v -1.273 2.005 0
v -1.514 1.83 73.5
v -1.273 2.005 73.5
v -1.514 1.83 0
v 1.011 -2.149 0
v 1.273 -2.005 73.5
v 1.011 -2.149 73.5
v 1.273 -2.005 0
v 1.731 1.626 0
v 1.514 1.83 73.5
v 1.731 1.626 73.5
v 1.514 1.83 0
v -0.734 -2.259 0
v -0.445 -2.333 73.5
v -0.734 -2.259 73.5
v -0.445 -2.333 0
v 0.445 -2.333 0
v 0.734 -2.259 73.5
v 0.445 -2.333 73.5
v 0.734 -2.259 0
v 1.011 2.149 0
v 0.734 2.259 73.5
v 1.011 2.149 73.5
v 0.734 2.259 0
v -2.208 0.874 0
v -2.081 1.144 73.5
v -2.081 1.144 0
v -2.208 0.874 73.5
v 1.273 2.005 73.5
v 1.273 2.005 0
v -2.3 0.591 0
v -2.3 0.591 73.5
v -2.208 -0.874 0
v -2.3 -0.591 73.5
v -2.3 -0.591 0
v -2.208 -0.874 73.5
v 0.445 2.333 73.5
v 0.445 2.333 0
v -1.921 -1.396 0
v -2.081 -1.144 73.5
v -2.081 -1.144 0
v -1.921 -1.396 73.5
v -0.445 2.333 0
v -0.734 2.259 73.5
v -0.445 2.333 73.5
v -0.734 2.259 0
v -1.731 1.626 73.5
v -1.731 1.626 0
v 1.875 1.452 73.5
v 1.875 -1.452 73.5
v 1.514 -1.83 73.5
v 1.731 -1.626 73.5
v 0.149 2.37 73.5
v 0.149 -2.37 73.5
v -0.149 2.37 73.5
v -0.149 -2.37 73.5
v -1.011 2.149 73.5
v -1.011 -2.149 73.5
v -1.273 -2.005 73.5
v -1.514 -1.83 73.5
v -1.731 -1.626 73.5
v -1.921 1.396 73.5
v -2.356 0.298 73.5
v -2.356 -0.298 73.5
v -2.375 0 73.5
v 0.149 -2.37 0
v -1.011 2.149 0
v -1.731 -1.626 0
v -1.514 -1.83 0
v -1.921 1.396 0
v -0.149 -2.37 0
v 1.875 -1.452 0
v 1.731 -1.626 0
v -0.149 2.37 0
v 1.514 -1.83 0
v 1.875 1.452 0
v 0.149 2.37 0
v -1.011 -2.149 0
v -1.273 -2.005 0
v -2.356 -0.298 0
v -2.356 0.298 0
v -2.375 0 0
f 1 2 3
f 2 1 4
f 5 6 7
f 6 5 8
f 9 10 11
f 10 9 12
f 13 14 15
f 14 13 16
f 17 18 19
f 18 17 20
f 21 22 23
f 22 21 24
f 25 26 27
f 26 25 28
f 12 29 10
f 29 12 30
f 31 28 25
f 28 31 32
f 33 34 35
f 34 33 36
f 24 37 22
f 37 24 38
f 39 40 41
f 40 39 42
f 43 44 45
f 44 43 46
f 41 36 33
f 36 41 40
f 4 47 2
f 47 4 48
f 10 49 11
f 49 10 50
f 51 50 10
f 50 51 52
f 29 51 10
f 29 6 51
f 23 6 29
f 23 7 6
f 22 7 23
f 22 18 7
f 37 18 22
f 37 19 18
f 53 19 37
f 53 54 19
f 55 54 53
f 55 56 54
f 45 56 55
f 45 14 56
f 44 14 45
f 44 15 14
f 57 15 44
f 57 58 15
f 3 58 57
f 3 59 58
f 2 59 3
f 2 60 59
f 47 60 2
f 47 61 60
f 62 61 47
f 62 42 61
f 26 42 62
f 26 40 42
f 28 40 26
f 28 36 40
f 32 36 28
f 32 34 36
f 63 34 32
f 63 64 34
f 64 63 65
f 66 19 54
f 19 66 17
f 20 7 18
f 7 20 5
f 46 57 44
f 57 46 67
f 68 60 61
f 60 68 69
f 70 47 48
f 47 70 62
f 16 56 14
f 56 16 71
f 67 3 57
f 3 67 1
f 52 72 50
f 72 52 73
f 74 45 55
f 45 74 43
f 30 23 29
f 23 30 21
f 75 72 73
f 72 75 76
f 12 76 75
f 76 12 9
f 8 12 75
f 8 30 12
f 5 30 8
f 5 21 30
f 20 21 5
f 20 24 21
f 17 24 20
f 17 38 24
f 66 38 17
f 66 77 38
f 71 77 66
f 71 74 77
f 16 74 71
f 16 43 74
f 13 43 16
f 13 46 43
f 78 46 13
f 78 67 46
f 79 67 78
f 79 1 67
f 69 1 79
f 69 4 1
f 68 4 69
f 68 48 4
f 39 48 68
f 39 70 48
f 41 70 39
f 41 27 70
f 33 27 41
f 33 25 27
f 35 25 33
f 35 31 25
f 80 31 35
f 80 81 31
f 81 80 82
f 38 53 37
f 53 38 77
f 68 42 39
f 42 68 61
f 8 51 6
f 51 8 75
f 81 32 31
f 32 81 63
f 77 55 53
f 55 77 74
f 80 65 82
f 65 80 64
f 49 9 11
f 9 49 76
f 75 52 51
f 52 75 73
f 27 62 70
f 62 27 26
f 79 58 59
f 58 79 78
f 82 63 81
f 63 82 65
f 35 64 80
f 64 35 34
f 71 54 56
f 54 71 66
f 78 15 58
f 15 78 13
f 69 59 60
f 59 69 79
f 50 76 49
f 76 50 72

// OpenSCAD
mm=1;
cm=10;
in=24.5;
length=3*in;
diam=4.75*mm;
flat=0.5*mm;
module tetrix_shaft(length=10, orient=[0,0,0]) {
    //length = length of the shaft
    //orient = orientation of the shaft along the x, y , or z axis
    //         defaults to z axis, with flat on the positive x axis
    diam = 4.75; //diameter of the shaft
    flat = 0.5; //how big is the flat edge
    //translate([0, 0, diam/2-flat])
    rotate([0, 90*orient[1], 0])
    rotate([-90*orient[1],90*orient[0],0])
    difference() {
        cylinder(h=length, d=diam, center=false, $fn=50);
        translate([diam/2-flat, -diam/2, 0]) cube([flat, diam, length]);
    }
}

tetrix_shaft(length);
